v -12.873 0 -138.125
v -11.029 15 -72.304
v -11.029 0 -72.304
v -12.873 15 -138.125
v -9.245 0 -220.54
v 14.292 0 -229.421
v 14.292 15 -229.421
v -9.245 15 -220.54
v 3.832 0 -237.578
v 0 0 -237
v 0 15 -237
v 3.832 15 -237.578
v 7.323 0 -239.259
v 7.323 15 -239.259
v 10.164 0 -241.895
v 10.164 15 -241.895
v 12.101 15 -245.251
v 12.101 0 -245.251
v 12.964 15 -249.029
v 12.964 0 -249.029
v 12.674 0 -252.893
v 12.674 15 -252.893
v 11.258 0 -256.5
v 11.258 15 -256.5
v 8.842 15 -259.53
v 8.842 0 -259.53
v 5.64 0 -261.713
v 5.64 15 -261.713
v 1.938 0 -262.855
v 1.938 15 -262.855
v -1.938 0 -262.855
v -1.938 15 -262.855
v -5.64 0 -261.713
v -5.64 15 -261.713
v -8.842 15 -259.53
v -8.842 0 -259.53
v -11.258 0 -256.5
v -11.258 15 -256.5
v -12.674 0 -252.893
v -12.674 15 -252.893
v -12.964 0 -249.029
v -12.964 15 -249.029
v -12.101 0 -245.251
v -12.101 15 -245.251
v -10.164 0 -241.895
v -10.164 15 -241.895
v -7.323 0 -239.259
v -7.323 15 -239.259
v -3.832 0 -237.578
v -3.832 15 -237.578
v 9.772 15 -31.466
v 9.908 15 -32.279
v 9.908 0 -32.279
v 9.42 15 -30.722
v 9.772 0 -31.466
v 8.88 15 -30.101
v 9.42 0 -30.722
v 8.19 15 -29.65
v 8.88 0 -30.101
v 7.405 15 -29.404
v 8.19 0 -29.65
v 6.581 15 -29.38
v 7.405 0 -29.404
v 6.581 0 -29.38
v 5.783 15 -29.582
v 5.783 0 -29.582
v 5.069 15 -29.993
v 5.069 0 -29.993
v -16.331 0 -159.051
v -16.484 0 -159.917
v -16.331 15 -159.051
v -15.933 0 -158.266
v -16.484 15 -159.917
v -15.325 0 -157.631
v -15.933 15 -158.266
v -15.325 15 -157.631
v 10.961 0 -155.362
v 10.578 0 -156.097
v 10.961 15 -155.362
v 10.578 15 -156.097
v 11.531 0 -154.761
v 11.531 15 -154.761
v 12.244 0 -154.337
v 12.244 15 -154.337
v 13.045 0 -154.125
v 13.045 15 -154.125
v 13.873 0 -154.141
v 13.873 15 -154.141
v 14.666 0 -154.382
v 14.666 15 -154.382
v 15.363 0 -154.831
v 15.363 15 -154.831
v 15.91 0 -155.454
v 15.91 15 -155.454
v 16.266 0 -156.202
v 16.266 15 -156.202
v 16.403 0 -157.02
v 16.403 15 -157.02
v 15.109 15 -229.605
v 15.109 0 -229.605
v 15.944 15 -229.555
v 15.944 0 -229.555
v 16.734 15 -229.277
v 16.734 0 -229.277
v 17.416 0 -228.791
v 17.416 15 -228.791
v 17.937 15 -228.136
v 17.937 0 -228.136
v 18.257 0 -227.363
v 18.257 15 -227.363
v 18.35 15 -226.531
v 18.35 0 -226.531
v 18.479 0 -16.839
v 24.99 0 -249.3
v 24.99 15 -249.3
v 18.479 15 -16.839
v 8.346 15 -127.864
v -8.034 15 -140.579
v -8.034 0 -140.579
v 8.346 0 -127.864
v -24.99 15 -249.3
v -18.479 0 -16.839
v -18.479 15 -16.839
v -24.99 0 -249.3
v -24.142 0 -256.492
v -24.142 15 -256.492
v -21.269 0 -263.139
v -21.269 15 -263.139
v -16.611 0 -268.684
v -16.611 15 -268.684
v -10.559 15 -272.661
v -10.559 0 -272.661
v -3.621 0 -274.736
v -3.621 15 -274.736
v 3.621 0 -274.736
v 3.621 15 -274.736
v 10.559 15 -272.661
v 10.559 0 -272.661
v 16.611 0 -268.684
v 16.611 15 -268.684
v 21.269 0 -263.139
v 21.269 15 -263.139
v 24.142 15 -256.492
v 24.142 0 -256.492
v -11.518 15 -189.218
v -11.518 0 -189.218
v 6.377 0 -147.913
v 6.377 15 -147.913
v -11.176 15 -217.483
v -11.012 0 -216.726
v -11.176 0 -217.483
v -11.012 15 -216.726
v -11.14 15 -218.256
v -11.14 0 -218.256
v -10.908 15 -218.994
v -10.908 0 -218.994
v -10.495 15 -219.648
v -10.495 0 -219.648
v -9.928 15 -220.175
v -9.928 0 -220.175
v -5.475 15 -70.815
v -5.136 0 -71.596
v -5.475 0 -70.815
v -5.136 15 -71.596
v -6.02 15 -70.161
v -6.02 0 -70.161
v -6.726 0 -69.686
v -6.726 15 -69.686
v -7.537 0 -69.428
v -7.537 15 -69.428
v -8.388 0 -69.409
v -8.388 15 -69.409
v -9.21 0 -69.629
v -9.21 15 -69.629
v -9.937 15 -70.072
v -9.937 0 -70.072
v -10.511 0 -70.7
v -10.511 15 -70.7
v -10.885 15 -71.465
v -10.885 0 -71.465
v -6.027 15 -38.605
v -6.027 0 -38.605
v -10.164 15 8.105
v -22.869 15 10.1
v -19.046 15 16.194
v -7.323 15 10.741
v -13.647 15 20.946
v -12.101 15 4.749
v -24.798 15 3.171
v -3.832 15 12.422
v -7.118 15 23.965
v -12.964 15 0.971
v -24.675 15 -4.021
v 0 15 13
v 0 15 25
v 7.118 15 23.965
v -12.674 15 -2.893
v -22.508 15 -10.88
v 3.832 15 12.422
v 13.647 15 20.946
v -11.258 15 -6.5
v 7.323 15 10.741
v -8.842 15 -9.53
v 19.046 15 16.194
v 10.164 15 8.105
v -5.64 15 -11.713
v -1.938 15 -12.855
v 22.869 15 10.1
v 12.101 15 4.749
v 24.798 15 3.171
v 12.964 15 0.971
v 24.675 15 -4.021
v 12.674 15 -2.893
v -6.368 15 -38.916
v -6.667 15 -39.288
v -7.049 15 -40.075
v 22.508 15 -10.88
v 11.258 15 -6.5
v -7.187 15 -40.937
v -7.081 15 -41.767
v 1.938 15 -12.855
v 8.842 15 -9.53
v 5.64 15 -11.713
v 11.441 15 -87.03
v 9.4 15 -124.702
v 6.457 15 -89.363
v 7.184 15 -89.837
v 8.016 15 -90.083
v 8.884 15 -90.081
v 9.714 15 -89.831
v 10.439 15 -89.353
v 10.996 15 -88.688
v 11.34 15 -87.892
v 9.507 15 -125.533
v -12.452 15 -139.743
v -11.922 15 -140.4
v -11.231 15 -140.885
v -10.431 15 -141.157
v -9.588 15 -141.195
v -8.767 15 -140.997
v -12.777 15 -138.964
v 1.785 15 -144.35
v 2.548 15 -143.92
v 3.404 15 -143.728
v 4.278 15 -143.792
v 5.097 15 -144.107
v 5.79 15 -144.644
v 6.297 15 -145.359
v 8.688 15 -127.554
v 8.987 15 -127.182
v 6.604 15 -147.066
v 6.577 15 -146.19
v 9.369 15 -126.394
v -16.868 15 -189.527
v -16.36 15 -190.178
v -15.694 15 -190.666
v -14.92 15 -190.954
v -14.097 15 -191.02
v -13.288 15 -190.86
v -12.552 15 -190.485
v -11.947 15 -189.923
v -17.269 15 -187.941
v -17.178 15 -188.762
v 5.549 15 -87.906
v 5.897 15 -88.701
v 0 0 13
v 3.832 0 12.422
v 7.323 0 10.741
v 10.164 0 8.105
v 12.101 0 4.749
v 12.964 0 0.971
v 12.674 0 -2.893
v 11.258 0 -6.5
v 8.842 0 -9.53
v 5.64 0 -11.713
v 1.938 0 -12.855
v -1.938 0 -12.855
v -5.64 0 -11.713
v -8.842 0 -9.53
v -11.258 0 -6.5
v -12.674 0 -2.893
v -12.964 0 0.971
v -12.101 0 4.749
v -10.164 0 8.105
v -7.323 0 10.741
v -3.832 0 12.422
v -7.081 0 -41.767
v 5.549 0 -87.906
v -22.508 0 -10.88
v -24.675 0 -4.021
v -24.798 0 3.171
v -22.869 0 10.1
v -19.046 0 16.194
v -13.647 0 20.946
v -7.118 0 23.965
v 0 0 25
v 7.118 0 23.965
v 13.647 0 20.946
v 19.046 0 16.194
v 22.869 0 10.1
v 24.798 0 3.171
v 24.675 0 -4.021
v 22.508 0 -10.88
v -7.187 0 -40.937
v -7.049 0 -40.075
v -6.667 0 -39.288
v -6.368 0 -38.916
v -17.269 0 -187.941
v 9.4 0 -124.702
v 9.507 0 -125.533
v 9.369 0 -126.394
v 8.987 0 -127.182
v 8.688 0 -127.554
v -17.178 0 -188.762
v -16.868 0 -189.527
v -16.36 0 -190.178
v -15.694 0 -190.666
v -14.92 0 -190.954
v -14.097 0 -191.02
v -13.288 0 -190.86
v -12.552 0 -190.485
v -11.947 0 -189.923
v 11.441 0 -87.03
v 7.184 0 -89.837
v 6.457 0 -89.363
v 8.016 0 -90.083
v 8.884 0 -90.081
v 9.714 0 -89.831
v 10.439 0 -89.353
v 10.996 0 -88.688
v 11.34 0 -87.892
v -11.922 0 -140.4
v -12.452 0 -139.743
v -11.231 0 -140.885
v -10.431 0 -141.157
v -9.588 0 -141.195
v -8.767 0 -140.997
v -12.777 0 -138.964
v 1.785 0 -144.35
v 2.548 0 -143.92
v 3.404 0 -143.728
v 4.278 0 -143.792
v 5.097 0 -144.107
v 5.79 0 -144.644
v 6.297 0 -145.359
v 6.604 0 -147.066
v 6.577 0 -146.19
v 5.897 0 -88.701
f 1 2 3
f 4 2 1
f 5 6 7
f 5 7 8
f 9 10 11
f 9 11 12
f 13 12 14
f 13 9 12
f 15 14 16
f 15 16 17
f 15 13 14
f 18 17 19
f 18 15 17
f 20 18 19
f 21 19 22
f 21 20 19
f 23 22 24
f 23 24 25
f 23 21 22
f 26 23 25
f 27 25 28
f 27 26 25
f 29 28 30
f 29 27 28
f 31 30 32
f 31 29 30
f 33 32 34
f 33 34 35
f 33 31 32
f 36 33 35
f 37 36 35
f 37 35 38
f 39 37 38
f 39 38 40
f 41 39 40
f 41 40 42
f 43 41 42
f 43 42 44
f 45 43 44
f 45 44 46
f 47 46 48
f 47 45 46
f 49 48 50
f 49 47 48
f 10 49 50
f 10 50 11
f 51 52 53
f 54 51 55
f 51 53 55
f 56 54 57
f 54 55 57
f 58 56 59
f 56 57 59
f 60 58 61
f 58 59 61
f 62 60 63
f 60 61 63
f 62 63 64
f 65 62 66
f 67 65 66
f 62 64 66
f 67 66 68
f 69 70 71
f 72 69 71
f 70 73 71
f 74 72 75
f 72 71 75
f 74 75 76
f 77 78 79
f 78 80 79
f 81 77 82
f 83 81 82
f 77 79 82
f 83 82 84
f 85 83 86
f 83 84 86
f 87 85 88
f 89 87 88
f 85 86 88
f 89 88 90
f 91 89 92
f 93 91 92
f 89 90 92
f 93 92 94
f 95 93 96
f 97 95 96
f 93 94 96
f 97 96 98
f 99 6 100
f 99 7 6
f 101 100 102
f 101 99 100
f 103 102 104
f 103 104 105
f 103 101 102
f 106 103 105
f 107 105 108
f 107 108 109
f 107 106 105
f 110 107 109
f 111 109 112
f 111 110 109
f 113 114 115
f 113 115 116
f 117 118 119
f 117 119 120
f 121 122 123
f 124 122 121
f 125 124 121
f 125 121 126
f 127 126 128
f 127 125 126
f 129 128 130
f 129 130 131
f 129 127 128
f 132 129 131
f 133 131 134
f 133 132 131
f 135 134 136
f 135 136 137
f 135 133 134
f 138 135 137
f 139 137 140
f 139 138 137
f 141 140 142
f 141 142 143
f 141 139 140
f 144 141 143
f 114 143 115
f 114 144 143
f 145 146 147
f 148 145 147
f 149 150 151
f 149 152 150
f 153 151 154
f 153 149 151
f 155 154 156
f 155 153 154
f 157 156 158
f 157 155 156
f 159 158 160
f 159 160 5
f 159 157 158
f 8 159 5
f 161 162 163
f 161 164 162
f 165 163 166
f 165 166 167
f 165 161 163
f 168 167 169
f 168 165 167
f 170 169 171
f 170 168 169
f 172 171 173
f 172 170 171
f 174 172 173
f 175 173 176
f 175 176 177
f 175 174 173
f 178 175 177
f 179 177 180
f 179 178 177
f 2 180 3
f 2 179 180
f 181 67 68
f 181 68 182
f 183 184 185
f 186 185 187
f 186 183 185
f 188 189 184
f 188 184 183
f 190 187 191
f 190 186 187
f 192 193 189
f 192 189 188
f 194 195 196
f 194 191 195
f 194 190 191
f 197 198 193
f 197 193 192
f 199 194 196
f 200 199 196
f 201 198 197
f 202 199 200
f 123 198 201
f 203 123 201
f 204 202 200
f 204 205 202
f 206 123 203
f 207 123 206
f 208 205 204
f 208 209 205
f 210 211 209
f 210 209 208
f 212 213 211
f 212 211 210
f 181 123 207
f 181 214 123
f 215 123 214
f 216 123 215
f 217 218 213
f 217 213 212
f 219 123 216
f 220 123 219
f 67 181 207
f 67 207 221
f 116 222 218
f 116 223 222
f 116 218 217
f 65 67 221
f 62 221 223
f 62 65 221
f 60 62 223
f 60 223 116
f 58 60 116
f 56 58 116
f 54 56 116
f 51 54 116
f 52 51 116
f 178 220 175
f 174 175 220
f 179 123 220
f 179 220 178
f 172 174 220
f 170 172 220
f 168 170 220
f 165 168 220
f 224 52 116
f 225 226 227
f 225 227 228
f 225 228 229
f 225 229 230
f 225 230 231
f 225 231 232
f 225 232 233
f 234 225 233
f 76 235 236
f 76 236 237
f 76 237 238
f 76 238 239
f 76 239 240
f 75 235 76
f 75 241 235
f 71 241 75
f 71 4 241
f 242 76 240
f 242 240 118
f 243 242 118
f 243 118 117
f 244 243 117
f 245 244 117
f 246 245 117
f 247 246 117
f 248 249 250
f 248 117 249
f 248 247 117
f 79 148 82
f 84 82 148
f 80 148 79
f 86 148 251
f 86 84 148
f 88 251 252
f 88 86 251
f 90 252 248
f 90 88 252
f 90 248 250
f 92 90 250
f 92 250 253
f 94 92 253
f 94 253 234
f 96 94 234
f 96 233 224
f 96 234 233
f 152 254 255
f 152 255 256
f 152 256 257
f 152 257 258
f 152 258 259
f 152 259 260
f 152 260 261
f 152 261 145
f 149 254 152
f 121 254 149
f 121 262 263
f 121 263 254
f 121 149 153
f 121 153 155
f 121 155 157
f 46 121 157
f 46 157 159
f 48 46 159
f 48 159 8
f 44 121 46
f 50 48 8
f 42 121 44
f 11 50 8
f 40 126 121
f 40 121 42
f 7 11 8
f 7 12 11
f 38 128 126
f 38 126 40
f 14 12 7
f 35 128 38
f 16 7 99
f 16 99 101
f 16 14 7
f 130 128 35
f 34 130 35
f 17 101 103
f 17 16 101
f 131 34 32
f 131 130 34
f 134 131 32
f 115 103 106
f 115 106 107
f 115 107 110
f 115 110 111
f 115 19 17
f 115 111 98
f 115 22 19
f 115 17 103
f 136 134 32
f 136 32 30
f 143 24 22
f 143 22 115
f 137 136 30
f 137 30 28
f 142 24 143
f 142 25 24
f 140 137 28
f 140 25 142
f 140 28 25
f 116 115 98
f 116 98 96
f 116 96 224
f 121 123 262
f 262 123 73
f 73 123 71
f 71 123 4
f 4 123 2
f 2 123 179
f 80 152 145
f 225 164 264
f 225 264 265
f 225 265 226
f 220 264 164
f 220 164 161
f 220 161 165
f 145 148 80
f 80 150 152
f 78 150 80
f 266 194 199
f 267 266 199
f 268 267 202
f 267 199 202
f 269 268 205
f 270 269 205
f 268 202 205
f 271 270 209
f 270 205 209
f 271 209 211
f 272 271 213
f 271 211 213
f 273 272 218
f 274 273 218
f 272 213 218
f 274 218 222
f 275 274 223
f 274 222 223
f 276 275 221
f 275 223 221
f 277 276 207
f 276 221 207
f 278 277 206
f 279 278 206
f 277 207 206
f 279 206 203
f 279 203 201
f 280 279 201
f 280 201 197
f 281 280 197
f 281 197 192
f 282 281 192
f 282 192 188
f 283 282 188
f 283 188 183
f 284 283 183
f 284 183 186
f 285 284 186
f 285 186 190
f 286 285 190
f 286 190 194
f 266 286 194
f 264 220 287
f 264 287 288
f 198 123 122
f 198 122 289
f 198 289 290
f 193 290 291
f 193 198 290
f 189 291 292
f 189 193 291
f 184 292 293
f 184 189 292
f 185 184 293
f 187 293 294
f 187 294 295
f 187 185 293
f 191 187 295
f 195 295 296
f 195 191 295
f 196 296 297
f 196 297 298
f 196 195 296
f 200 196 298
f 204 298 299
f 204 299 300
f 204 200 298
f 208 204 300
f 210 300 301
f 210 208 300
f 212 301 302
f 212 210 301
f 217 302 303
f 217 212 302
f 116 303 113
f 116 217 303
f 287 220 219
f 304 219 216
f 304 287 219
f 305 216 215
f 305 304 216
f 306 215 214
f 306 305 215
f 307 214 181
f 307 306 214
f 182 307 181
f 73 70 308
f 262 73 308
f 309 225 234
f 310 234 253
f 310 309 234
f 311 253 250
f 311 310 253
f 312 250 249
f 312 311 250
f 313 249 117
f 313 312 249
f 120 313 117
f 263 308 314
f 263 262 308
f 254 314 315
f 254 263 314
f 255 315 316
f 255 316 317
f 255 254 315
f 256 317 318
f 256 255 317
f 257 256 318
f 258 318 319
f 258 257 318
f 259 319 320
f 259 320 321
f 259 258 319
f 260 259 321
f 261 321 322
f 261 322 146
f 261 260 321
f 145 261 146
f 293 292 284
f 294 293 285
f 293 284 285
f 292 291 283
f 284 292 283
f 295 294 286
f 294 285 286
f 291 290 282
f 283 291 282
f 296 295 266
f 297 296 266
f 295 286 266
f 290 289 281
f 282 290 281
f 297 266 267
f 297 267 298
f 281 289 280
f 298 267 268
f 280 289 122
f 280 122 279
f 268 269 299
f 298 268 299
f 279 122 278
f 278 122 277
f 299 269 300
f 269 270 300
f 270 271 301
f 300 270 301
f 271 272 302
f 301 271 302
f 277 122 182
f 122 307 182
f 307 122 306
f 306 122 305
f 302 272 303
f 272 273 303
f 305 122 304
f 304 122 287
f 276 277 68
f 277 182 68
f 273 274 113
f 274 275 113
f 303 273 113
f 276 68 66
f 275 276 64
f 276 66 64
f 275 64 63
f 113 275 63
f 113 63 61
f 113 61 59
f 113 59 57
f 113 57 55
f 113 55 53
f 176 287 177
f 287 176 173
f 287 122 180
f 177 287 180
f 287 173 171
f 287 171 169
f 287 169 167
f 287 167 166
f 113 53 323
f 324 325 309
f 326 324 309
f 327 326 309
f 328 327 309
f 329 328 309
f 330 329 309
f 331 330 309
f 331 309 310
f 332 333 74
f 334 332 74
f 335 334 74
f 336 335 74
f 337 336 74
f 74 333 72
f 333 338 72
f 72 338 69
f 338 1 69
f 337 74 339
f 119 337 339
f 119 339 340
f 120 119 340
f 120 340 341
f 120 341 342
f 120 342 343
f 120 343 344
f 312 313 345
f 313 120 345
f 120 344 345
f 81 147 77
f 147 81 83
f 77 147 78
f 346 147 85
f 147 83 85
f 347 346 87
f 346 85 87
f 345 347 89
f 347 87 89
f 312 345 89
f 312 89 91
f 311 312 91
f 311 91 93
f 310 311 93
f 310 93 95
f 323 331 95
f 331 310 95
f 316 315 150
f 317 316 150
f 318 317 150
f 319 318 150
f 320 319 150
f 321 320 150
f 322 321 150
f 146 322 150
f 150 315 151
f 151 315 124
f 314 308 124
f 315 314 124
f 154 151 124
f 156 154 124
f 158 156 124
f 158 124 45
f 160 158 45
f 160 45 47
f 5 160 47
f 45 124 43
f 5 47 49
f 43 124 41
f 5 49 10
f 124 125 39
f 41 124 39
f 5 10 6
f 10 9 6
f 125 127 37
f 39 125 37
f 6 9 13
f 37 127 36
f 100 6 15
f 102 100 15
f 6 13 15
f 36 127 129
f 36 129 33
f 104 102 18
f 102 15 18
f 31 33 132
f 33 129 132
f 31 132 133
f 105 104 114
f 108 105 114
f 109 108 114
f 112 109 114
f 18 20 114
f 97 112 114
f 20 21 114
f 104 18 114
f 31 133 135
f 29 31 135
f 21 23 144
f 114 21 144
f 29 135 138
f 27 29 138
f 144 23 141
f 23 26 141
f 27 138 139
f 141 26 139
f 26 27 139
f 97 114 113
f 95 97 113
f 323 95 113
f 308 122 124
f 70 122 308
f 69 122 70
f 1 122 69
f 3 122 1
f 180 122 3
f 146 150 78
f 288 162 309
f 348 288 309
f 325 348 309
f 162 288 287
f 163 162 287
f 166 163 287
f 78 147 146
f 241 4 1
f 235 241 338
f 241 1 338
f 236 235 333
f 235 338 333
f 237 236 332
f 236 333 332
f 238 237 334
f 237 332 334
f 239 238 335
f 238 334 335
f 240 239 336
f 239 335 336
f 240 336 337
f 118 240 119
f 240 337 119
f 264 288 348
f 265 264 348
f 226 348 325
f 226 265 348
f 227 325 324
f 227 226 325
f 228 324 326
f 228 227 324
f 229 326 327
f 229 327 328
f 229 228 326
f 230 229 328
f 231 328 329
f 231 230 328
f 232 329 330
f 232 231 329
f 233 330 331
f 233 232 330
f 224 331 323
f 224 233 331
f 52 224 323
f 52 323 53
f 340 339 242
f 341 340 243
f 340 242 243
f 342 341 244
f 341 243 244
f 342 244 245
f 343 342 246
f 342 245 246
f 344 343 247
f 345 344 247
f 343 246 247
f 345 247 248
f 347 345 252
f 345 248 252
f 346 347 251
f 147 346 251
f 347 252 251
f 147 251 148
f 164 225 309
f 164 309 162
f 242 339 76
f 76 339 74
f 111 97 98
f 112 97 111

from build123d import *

# Parameters (mm, degrees)
SKETCH_1_R          = 5.05
SKETCH_1_R_2        = 13
EXTRUDE_1_DEPTH     = 15
FILLET_1_R          = 3
CUT_EXTRUDE_3_DEPTH = 277.54113618
FILLET_2_R          = 3
EXTRUDE_3_DEPTH     = 15
FILLET_4_R          = 3
SKETCH_8_R          = 13
CUT_EXTRUDE_5_DEPTH = 277.54113618
SKETCH_9_R          = 25
SKETCH_9_R_2        = 13
EXTRUDE_4_DEPTH     = 15


with BuildPart() as part:
    # 草图1 → 凸台-拉伸1 (new body)
    with BuildSketch(Plane(origin=(0, 0, 0), x_dir=(1, 0, 0), z_dir=(0, 1, 0))):
        with BuildLine():
            Line((-17.992942616, -0.504), (-24.990198078, 249.3))
            ThreePointArc((-24.990198078, 249.3), (0, 275), (24.990198078, 249.3))
            Line((24.990198078, 249.3), (17.992942616, -0.504))
            ThreePointArc((17.992942616, -0.504), (0, -18), (-17.992942616, -0.504))
        make_face()
        with Locations(Location((0, 0, 0), (0, 0, 270))):
            Circle(SKETCH_1_R, mode=Mode.SUBTRACT)
        with Locations(Location((0, 250, 0), (0, 0, 270))):
            Circle(SKETCH_1_R_2, mode=Mode.SUBTRACT)
        Polygon((-16.444447487, 158.5), (-17.704941698, 203.5), (11.028871219, 137.174942267), align=None, mode=Mode.SUBTRACT)
        Polygon((15.954255294, 141), (18.475243716, 231), (-12, 219.5), align=None, mode=Mode.SUBTRACT)
    extrude(amount=EXTRUDE_1_DEPTH)

    # 圆角1
    fillet_1_edges = [part.edges().sort_by_distance(p)[0] for p in [
        (-16.444447487, 7.5, -158.5),
        (11.028871219, 7.5, -137.174942267),
        (-17.704941698, 7.5, -203.5),
        (18.475243716, 7.5, -231),
        (-12, 7.5, -219.5),
        (15.954255294, 7.5, -141),
    ]]
    fillet(fillet_1_edges, radius=FILLET_1_R)

    # 草图4 → 切除-拉伸3 (cut, through all)
    with BuildSketch(Plane(origin=(0, 15, 0), x_dir=(1, 0, 0), z_dir=(0, 1, 0))):
        Polygon((-13.050343026, 144.472367448), (12.494927596, 124.643879429), (9.742058902, 26.365688077), (-10.175105816, 41.825585442), align=None)
    extrude(amount=-CUT_EXTRUDE_3_DEPTH, mode=Mode.SUBTRACT)

    # 圆角2
    fillet_2_edges = [part.edges().sort_by_distance(p)[0] for p in [
        (-10.175105816, 7.5, -41.825585442),
        (-13.050343026, 7.5, -144.472367448),
        (9.742058902, 7.5, -26.365688077),
    ]]
    fillet(fillet_2_edges, radius=FILLET_2_R)

    # 草图6 → 凸台-拉伸3 (add)
    with BuildSketch(Plane(origin=(0, 15, 0), x_dir=(1, 0, 0), z_dir=(0, 1, 0))):
        Polygon((9.60137553, 125.435937788), (-13.068657882, 42.617643801), (-7.609801347, 39.834371112), (-7.28155375, 41.033527083), (15.388479662, 123.85182107), (9.929623127, 126.635093759), align=None)
    extrude(amount=-EXTRUDE_3_DEPTH)

    # 圆角4
    fillet_4_edges = [part.edges().sort_by_distance(p)[0] for p in [
        (9.929623127, 7.5, -126.635093759),
        (12.14036175, 7.5, -111.985778385),
        (-7.609801347, 7.5, -39.834371112),
        (-10.463842583, 7.5, -52.133569747),
    ]]
    fillet(fillet_4_edges, radius=FILLET_4_R)

    # 草图8 → 切除-拉伸5 (cut, through all)
    with BuildSketch(Plane(origin=(0, 15, 0), x_dir=(1, 0, 0), z_dir=(0, 1, 0))):
        with Locations(Location((0, 0, 0), (0, 0, 270))):
            Circle(SKETCH_8_R)
    extrude(amount=-CUT_EXTRUDE_5_DEPTH, mode=Mode.SUBTRACT)

    # 草图9 → 凸台-拉伸4 (add)
    with BuildSketch(Plane(origin=(0, 15, 0), x_dir=(1, 0, 0), z_dir=(0, 1, 0))):
        Circle(SKETCH_9_R)
        with Locations(Location((0, 0, 0), (0, 0, 270))):
            Circle(SKETCH_9_R_2, mode=Mode.SUBTRACT)
    extrude(amount=-EXTRUDE_4_DEPTH)


solid = part.part
